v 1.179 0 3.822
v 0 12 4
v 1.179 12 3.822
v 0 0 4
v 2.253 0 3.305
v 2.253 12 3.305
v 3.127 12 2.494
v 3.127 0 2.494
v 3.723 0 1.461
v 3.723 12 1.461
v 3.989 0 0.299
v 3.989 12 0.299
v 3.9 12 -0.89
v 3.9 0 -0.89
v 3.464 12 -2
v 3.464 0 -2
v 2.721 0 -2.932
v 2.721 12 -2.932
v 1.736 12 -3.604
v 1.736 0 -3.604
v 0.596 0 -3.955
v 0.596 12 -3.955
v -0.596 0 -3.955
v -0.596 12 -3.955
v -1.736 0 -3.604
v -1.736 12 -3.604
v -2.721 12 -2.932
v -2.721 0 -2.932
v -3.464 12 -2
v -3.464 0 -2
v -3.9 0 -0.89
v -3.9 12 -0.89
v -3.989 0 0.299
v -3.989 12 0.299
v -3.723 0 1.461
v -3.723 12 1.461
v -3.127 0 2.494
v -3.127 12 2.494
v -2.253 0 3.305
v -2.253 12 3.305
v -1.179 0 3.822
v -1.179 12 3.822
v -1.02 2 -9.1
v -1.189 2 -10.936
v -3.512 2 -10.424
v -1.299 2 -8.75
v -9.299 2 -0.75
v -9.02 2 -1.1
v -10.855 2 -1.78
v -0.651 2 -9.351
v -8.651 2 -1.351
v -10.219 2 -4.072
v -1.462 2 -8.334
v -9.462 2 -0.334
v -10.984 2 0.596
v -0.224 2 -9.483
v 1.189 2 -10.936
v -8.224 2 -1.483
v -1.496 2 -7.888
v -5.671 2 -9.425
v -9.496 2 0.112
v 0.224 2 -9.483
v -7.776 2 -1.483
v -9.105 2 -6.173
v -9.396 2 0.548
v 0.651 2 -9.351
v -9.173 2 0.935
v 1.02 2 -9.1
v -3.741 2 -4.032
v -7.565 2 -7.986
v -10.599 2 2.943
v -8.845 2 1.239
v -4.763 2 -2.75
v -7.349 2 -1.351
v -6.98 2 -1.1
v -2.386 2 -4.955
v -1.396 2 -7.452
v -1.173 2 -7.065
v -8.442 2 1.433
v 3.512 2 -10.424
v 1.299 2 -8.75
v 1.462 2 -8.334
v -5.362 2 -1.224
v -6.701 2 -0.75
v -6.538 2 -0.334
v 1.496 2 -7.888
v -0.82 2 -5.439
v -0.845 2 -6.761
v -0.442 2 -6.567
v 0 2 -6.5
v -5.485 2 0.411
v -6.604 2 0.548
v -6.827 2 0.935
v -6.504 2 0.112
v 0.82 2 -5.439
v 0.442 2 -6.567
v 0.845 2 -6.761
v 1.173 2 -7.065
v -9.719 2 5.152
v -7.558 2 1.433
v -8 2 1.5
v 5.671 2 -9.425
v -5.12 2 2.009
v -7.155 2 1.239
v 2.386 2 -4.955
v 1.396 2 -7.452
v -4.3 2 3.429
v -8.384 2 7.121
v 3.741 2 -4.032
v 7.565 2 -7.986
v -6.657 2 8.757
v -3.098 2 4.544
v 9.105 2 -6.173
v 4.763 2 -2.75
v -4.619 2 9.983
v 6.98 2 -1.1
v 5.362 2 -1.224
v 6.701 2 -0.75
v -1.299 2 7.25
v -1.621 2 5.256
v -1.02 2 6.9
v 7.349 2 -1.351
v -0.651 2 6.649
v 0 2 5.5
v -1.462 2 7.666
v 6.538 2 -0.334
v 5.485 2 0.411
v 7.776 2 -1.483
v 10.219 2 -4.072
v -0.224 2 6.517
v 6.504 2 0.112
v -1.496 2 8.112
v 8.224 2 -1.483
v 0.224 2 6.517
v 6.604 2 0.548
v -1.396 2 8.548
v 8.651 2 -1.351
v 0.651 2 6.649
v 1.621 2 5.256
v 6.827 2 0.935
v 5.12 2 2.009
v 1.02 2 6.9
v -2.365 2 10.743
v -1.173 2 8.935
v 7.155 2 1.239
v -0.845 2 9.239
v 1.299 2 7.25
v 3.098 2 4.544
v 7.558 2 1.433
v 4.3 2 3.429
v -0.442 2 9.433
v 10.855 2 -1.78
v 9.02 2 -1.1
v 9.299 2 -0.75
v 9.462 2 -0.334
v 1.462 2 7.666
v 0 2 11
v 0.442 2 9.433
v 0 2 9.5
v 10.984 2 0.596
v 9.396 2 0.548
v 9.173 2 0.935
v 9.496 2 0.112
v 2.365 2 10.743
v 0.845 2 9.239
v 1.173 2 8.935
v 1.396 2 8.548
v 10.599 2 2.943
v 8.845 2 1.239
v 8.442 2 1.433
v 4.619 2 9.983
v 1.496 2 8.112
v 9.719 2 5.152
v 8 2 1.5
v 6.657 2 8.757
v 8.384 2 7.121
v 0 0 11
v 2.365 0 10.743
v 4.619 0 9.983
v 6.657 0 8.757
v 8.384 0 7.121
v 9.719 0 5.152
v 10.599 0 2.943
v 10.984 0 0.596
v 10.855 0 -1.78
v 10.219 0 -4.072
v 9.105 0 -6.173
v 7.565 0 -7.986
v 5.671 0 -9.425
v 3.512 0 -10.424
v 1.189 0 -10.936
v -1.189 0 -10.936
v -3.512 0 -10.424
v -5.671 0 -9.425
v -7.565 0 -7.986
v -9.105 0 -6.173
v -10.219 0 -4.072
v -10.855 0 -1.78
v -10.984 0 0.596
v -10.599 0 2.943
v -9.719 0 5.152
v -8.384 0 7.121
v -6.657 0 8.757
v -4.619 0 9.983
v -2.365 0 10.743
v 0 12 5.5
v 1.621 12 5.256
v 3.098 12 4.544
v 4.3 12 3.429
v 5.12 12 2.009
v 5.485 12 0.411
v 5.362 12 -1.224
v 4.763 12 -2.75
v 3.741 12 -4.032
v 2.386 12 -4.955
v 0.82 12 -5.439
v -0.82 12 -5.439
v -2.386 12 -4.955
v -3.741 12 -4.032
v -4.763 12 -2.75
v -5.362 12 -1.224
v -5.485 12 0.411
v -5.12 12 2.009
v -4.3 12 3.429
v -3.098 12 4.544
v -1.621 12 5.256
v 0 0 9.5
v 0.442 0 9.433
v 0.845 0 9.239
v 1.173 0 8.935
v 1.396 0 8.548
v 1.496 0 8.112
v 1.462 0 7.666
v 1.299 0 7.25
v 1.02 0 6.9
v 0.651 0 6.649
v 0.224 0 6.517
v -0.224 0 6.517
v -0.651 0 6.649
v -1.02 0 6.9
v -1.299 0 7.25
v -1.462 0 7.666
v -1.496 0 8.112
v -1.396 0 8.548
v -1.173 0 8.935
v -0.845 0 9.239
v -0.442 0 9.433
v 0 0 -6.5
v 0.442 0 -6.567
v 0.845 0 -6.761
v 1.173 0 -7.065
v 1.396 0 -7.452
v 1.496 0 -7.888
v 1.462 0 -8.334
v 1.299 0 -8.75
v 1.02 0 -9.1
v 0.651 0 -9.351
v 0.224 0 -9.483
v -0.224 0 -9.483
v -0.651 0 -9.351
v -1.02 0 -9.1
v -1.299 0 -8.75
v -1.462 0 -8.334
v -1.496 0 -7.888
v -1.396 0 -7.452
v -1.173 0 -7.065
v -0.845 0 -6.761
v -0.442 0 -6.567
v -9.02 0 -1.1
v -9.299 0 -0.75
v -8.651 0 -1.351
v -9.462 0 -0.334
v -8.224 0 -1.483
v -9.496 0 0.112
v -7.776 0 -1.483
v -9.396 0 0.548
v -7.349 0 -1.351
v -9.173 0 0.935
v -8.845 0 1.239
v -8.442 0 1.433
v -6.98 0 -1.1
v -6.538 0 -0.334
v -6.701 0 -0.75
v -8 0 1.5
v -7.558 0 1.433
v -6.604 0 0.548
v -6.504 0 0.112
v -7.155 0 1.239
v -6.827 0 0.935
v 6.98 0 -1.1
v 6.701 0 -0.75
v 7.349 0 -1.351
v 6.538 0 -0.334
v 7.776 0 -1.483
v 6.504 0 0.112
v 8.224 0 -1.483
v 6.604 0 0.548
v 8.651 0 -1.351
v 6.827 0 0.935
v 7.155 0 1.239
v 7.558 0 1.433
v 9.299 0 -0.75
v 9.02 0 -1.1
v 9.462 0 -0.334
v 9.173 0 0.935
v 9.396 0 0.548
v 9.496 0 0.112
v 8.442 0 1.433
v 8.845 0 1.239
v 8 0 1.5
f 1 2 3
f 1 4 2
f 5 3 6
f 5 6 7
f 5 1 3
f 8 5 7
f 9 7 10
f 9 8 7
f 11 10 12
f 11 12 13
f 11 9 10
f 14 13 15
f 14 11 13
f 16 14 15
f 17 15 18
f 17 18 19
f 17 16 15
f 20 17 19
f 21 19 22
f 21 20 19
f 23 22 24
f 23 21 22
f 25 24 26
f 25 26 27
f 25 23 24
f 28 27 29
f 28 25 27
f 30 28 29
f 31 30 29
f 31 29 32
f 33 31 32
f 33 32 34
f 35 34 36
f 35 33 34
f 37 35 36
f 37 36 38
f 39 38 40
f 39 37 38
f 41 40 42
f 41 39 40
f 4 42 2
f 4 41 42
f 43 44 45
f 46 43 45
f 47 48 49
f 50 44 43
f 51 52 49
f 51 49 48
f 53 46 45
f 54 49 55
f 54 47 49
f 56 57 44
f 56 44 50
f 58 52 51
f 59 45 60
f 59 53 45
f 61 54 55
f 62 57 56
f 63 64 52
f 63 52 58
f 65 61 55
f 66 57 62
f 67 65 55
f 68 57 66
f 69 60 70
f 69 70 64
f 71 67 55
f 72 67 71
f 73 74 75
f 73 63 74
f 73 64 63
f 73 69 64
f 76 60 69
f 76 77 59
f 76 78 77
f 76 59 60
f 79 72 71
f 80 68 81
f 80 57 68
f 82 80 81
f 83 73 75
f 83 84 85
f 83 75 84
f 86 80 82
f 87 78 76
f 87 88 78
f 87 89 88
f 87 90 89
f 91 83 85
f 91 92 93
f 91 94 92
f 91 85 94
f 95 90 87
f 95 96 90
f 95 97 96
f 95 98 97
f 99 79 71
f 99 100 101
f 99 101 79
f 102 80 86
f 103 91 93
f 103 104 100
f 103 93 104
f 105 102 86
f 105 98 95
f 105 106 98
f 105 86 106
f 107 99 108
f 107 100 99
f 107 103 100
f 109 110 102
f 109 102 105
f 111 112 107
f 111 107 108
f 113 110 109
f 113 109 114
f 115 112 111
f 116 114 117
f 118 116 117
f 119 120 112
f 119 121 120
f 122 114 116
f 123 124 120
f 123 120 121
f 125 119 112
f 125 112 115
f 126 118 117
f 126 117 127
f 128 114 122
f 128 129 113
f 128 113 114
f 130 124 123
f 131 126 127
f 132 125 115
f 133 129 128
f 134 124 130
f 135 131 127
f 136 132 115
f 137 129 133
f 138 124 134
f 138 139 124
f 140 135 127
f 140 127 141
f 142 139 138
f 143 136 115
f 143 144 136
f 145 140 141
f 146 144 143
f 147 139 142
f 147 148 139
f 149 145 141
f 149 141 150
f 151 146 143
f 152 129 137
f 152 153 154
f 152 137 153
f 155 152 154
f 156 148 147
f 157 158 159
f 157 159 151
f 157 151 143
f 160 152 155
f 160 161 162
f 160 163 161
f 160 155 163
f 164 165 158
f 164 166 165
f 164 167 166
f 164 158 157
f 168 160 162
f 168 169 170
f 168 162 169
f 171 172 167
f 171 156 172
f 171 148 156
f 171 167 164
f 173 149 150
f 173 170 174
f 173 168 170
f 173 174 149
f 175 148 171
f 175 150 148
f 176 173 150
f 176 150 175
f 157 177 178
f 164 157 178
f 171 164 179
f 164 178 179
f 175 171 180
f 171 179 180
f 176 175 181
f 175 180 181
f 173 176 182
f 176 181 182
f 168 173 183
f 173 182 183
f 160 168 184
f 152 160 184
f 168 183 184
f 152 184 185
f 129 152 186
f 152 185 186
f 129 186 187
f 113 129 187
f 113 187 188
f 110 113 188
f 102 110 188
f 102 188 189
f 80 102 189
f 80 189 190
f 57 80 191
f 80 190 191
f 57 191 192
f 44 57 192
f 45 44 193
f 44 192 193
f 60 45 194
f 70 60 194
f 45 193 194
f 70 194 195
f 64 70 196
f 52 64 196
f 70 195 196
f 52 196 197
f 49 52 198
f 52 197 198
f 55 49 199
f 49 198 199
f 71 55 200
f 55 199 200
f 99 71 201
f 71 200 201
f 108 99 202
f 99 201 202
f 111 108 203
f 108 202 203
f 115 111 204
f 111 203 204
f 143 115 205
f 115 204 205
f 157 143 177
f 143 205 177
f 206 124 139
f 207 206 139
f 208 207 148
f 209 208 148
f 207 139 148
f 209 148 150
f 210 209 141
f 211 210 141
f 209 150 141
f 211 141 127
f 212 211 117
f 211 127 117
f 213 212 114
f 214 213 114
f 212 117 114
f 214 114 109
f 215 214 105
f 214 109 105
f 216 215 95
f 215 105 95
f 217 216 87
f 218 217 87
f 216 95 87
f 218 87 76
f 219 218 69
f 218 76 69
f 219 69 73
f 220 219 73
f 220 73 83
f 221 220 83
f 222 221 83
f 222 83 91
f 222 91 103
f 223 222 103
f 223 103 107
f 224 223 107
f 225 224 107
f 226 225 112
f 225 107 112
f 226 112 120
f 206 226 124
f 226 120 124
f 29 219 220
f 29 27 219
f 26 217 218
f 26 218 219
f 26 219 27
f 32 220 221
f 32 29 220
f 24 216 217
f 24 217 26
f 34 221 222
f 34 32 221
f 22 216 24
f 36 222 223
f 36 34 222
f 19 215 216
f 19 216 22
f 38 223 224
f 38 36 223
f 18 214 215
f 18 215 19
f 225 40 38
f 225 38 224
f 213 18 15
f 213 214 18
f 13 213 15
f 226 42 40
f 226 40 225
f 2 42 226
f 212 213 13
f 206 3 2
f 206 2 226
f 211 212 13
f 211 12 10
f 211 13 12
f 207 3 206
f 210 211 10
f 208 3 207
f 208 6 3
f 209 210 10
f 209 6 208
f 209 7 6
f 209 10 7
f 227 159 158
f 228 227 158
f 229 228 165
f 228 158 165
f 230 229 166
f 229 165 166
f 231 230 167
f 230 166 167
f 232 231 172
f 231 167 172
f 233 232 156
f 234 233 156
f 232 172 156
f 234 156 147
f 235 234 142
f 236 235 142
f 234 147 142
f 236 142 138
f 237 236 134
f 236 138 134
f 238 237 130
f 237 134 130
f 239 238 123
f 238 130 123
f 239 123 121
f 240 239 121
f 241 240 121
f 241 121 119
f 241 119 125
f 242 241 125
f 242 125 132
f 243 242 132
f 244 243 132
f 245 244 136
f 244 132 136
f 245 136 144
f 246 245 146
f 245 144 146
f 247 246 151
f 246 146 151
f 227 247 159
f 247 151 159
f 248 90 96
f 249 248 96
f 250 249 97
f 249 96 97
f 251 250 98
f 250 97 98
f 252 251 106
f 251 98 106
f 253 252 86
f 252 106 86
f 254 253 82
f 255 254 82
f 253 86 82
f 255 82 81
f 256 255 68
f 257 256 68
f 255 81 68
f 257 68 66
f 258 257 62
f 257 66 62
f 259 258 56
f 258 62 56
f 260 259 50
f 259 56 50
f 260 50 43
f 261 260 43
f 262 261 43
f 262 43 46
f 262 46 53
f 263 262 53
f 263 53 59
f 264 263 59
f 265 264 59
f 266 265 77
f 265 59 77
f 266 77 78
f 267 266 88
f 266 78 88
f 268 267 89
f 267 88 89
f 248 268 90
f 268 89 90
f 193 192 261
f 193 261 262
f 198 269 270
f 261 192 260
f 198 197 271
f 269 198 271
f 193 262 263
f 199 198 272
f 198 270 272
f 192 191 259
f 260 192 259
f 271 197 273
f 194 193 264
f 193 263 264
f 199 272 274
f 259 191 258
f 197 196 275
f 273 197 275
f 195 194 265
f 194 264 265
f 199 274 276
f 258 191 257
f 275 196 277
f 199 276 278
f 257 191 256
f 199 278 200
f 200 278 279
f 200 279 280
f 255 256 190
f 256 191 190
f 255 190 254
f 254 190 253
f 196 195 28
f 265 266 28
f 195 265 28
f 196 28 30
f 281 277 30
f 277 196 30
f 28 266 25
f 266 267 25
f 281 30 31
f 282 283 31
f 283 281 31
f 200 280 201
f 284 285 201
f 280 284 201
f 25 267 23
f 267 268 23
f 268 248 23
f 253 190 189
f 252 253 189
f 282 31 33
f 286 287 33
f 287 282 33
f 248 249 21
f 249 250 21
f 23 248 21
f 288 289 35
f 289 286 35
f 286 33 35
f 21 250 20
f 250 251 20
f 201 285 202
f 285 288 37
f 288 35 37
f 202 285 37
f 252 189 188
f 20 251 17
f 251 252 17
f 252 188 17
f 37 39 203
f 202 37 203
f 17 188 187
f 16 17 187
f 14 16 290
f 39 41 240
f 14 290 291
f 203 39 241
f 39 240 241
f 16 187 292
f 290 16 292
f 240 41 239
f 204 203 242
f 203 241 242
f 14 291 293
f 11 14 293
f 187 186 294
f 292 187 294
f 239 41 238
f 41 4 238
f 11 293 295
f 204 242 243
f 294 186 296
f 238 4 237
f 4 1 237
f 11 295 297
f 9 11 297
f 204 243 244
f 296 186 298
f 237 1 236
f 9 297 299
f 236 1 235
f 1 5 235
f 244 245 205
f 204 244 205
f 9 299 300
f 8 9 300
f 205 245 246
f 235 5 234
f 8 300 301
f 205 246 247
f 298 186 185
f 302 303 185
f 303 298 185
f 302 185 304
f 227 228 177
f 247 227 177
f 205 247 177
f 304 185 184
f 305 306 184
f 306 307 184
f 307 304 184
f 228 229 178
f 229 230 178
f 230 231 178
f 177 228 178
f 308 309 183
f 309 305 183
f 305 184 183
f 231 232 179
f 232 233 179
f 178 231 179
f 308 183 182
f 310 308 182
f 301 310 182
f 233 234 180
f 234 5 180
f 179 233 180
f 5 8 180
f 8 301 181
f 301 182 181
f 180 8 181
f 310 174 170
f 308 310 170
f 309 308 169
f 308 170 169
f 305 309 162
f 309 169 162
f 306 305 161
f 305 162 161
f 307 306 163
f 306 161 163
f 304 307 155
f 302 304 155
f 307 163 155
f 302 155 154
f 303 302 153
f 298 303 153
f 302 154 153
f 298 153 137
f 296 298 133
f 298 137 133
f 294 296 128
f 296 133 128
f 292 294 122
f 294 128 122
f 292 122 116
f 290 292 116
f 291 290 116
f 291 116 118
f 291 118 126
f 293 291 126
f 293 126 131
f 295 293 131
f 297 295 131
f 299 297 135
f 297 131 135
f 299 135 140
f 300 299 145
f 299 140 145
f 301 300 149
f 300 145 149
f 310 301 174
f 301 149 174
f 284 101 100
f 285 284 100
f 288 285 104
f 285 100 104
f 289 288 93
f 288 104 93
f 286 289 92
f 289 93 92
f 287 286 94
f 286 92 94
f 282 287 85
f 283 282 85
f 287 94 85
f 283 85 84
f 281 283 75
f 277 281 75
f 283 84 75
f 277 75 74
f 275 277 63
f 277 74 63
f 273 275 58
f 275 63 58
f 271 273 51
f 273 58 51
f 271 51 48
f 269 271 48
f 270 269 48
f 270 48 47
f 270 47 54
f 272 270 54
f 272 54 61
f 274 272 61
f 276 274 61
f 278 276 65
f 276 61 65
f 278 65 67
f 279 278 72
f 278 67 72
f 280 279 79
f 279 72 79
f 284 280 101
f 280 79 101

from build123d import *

# Parameters (mm, degrees)
SKETCH1_R           = 11
SKETCH1_R_2         = 4
BOSS_EXTRUDE1_DEPTH = 2
SKETCH2_R           = 1.5
CUT_EXTRUDE1_DEPTH  = 2
SKETCH3_R           = 5.5
SKETCH3_R_2         = 4
BOSS_EXTRUDE2_DEPTH = 10


with BuildPart() as part:
    # Sketch1 → Boss-Extrude1 (new body)
    with BuildSketch(Plane(origin=(0, 0, 0), x_dir=(1, 0, 0), z_dir=(0, 1, 0))):
        with Locations(Location((0, 0, 0), (0, 0, 270))):
            Circle(SKETCH1_R)
        with Locations(Location((0, 0, 0), (0, 0, 270))):
            Circle(SKETCH1_R_2, mode=Mode.SUBTRACT)
    extrude(amount=BOSS_EXTRUDE1_DEPTH)

    # Sketch2 → Cut-Extrude1 (cut)
    with BuildSketch(Plane(origin=(0, 2, 0), x_dir=(1, 0, 0), z_dir=(0, 1, 0))):
        with Locations(Location((8, 0, 0), (0, 0, 270))):
            Circle(SKETCH2_R)
        with Locations(Location((-8, 0, 0), (0, 0, 270))):
            Circle(SKETCH2_R)
        with Locations(Location((0, 8, 0), (0, 0, 270))):
            Circle(SKETCH2_R)
        with Locations(Location((0, -8, 0), (0, 0, 270))):
            Circle(SKETCH2_R)
    extrude(amount=-CUT_EXTRUDE1_DEPTH, mode=Mode.SUBTRACT)

    # Sketch3 → Boss-Extrude2 (add)
    with BuildSketch(Plane(origin=(0, 2, 0), x_dir=(1, 0, 0), z_dir=(0, 1, 0))):
        with Locations(Location((0, 0, 0), (0, 0, 270))):
            Circle(SKETCH3_R)
        with Locations(Location((0, 0, 0), (0, 0, 270))):
            Circle(SKETCH3_R_2, mode=Mode.SUBTRACT)
    extrude(amount=BOSS_EXTRUDE2_DEPTH)


solid = part.part
